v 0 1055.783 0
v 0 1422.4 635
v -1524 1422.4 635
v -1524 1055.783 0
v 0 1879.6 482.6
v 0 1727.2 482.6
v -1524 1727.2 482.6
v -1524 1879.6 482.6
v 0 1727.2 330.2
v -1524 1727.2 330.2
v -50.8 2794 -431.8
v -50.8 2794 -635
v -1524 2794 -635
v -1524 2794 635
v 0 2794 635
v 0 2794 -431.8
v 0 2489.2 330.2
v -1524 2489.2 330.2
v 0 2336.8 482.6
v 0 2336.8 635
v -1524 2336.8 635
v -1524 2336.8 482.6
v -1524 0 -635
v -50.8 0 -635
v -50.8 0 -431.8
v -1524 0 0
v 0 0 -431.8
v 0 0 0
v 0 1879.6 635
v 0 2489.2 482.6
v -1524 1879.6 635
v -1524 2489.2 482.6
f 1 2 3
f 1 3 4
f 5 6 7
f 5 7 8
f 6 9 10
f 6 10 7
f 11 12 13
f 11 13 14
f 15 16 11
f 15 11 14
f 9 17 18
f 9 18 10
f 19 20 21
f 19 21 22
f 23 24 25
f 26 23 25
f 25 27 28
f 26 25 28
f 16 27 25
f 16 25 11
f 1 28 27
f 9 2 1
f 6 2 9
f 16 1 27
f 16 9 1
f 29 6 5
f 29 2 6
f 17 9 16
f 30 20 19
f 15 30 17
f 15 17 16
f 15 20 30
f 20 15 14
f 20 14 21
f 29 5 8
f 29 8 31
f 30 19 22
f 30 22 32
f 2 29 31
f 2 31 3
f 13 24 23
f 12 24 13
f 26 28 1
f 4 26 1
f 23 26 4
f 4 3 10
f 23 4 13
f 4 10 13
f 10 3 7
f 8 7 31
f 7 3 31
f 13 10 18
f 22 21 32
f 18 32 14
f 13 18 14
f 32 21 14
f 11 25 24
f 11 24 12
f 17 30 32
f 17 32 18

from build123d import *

# Parameters (mm, degrees)
F0_W     = 2794
F0_H     = 635
F1_DEPTH = 1524
F3_DEPTH = 1524
F4_W     = 2794
F4_H     = 203.2
F5_DEPTH = 50.8


with BuildPart() as f1:
    # F0 (on Right) → F1 (new body)
    with BuildSketch(Plane.YZ):
        with Locations((1397, -317.5)):
            Rectangle(F0_W, F0_H)
    extrude(amount=-F1_DEPTH)

    # F2 (on face) → F3 (join)
    with BuildSketch(Plane.YZ):
        Polygon((1055.782579, 0), (2794, 0), (2794, 635), (2336.8, 635), (2336.8, 482.6), (2489.2, 482.6), (2489.2, 330.2), (1727.2, 330.2), (1727.2, 482.6), (1879.6, 482.6), (1879.6, 635), (1422.4, 635), align=None)
    extrude(amount=-F3_DEPTH)

    # F4 (on face) → F5 (cut)
    with BuildSketch(Plane.YZ):
        with Locations((1397, -533.4)):
            Rectangle(F4_W, F4_H)
    extrude(amount=-F5_DEPTH, mode=Mode.SUBTRACT)


solid = f1.part
